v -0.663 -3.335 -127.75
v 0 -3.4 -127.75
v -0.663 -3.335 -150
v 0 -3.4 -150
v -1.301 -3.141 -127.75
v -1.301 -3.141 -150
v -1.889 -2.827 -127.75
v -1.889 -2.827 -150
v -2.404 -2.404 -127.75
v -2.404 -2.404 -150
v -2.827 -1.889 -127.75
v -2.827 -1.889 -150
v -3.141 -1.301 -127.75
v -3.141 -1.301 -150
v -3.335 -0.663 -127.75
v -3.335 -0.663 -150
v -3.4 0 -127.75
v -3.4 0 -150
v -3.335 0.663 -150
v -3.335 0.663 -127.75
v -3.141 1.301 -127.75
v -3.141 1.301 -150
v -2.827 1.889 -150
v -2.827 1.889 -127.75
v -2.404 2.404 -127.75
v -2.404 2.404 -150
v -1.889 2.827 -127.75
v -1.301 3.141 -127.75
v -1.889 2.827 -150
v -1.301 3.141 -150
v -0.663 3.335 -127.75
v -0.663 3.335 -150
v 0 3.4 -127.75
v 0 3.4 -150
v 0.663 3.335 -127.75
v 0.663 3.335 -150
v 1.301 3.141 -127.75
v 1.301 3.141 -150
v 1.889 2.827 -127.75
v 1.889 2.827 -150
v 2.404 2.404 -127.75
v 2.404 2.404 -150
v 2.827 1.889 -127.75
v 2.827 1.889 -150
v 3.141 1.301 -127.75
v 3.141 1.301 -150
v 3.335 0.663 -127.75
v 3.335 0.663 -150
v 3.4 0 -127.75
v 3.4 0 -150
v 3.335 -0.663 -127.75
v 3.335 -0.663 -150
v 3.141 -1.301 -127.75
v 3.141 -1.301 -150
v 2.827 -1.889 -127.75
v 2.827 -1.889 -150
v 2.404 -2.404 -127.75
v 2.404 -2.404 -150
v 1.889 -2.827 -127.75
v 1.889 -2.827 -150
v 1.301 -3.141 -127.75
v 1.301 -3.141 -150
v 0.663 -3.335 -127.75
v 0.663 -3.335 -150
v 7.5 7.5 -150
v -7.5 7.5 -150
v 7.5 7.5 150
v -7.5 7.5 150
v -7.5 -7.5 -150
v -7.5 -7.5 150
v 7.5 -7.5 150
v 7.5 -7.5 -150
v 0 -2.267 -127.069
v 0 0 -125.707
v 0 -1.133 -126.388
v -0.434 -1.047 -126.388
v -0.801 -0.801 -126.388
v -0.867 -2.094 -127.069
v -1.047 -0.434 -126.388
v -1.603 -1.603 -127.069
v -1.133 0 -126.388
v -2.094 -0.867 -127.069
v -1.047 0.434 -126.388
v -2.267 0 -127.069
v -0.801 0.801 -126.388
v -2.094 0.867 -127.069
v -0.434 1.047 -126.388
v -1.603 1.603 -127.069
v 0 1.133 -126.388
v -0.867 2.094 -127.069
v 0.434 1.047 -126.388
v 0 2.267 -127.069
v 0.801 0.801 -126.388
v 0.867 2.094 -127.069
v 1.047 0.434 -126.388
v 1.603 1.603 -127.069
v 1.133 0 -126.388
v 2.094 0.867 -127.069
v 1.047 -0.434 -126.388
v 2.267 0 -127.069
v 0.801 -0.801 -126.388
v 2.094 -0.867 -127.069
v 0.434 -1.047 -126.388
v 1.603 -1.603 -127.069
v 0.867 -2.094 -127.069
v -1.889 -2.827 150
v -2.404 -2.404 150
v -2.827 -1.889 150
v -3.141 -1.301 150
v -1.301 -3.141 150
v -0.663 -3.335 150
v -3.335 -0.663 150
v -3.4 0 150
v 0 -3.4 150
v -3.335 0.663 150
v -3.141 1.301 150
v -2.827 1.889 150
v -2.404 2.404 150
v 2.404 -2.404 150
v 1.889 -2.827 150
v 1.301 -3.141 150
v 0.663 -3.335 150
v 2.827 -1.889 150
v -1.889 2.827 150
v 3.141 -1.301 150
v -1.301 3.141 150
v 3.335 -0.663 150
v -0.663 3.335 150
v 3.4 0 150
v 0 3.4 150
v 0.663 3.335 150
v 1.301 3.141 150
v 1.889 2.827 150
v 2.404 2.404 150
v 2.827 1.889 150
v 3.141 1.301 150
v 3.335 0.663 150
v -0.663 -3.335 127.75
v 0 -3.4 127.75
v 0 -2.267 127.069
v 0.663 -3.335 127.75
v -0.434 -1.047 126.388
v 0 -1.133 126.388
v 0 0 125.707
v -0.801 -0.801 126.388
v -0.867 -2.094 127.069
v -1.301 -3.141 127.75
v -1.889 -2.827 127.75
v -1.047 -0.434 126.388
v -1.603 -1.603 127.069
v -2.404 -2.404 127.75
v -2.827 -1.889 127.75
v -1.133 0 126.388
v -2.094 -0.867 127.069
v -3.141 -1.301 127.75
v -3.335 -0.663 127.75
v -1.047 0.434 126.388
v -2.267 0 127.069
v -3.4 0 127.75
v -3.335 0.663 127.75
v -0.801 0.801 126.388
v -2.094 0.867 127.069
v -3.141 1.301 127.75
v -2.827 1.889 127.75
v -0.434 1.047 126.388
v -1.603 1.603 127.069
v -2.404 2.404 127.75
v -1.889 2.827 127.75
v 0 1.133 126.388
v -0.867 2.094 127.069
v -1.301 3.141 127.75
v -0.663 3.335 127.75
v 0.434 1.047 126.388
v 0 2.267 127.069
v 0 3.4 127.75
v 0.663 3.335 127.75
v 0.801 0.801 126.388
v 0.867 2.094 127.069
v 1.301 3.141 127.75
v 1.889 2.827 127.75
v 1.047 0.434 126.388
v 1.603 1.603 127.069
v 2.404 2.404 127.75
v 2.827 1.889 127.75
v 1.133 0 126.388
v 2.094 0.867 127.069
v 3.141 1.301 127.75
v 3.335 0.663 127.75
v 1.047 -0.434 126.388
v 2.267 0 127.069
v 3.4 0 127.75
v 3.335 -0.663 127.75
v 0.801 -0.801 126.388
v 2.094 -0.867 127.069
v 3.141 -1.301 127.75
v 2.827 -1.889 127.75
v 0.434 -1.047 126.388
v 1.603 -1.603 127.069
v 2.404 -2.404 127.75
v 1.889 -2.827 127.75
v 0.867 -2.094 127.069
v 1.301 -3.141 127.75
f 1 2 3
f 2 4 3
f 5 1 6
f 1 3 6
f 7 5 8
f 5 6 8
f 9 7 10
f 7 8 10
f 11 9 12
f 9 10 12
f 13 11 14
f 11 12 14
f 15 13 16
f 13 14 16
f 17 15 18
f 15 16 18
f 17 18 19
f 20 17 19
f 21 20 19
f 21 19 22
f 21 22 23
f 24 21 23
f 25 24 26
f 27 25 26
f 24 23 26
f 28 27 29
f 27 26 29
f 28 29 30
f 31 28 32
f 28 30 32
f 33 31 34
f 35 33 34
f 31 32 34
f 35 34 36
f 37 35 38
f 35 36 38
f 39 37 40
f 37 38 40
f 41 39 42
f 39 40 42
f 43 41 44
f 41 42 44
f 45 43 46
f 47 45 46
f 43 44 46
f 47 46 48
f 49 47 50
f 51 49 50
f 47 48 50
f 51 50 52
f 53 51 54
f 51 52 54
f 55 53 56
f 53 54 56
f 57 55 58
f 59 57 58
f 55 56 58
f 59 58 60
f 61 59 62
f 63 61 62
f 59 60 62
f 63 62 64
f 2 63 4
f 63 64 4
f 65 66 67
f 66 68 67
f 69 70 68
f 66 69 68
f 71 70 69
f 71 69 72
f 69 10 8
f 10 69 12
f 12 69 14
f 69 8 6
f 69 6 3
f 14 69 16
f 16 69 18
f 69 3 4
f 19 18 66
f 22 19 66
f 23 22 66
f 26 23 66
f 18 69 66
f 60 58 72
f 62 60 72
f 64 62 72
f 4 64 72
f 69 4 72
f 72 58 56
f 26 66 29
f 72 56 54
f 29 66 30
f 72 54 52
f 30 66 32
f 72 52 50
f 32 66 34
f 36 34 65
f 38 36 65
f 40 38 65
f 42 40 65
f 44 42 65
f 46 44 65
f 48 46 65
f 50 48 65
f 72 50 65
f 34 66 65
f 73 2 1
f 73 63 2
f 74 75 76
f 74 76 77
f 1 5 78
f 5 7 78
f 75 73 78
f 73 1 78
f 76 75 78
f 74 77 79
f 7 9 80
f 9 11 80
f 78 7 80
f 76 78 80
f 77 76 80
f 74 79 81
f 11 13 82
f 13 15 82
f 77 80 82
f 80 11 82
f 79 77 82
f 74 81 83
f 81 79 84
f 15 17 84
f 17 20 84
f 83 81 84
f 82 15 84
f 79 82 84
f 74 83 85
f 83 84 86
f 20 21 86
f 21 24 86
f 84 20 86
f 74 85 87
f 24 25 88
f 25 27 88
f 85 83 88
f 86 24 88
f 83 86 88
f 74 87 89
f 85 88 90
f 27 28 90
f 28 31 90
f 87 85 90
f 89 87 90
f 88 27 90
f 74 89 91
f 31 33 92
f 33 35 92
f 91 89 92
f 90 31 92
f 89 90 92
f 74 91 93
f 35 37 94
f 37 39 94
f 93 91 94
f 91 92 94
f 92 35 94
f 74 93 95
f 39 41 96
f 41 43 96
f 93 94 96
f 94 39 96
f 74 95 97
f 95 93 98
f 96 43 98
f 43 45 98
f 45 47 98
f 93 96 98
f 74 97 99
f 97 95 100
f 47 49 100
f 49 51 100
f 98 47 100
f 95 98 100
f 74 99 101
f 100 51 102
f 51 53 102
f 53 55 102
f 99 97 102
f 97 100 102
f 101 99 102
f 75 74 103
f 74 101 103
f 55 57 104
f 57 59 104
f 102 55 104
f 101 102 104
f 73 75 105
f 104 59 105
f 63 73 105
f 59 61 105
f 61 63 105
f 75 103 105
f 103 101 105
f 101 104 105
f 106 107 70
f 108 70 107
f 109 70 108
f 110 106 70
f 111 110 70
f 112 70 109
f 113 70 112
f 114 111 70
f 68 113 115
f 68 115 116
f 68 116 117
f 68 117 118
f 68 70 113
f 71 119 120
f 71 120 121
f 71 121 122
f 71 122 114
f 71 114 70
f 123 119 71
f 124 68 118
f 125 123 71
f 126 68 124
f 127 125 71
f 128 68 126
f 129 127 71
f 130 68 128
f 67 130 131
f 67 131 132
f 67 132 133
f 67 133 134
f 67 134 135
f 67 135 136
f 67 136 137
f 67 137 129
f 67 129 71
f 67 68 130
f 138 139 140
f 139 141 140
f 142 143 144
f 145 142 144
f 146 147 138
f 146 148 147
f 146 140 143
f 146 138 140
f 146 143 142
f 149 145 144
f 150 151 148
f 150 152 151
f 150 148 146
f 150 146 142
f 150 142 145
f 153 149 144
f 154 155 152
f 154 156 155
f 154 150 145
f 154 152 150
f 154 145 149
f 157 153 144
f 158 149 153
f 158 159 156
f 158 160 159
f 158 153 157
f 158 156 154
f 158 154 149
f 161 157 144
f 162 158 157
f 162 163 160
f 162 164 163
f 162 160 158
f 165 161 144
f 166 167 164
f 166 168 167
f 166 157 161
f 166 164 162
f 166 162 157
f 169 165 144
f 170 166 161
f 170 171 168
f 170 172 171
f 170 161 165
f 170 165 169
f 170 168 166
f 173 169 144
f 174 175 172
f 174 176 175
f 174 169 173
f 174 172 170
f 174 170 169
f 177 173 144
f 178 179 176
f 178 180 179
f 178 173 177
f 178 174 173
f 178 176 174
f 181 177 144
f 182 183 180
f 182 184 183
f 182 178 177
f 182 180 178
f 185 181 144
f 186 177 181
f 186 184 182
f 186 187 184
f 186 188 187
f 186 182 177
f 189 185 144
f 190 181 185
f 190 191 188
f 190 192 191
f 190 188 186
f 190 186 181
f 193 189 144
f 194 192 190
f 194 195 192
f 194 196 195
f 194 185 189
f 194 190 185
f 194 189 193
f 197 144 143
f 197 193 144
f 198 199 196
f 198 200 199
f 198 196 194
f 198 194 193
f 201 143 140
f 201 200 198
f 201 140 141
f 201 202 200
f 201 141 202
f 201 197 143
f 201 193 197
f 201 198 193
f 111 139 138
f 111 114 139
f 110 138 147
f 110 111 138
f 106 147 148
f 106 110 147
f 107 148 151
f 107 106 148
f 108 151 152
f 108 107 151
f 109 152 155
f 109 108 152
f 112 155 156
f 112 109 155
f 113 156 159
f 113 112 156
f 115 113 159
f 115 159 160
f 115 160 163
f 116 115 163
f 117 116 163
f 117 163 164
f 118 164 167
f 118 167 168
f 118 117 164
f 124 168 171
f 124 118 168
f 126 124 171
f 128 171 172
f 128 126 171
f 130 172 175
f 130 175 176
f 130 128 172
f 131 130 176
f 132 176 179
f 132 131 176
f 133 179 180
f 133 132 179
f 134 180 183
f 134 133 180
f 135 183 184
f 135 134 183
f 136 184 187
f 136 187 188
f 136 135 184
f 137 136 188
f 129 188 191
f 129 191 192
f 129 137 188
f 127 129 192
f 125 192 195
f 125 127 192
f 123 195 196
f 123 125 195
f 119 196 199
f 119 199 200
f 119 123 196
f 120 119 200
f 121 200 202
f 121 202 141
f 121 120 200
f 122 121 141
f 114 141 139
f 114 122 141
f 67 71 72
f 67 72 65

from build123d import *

# Parameters (mm, degrees)
IZIM1_W                     = 15
IZIM1_H                     = 15
Y_KSEKLIK_EKSTR_ZYON1_DEPTH = 150


with BuildPart() as part:
    # Çizim1 → Yükseklik-Ekstrüzyon1 (new body, symmetric)
    with BuildSketch(Plane.XY):
        Rectangle(IZIM1_W, IZIM1_H)
    extrude(amount=Y_KSEKLIK_EKSTR_ZYON1_DEPTH, both=True)

    # Çizim3 → M8 Dişli Delik1 (revolve, cut)
    with BuildSketch(Plane(origin=(0, 0, 150), x_dir=(0, -1, 0), z_dir=(1, 0, 0))):
        Polygon((0, 0), (0, 24.292926105), (3.4, 22.25), (3.4, 0), align=None)
    m8_di_li_delik1 = revolve(axis=Axis((0, 0, 156.35), (0, 0, -1)), mode=Mode.SUBTRACT)

    # Aynalama1: M8 Dişli Delik1 across plane
    add(m8_di_li_delik1.mirror(Plane.XY), mode=Mode.SUBTRACT)


solid = part.part
